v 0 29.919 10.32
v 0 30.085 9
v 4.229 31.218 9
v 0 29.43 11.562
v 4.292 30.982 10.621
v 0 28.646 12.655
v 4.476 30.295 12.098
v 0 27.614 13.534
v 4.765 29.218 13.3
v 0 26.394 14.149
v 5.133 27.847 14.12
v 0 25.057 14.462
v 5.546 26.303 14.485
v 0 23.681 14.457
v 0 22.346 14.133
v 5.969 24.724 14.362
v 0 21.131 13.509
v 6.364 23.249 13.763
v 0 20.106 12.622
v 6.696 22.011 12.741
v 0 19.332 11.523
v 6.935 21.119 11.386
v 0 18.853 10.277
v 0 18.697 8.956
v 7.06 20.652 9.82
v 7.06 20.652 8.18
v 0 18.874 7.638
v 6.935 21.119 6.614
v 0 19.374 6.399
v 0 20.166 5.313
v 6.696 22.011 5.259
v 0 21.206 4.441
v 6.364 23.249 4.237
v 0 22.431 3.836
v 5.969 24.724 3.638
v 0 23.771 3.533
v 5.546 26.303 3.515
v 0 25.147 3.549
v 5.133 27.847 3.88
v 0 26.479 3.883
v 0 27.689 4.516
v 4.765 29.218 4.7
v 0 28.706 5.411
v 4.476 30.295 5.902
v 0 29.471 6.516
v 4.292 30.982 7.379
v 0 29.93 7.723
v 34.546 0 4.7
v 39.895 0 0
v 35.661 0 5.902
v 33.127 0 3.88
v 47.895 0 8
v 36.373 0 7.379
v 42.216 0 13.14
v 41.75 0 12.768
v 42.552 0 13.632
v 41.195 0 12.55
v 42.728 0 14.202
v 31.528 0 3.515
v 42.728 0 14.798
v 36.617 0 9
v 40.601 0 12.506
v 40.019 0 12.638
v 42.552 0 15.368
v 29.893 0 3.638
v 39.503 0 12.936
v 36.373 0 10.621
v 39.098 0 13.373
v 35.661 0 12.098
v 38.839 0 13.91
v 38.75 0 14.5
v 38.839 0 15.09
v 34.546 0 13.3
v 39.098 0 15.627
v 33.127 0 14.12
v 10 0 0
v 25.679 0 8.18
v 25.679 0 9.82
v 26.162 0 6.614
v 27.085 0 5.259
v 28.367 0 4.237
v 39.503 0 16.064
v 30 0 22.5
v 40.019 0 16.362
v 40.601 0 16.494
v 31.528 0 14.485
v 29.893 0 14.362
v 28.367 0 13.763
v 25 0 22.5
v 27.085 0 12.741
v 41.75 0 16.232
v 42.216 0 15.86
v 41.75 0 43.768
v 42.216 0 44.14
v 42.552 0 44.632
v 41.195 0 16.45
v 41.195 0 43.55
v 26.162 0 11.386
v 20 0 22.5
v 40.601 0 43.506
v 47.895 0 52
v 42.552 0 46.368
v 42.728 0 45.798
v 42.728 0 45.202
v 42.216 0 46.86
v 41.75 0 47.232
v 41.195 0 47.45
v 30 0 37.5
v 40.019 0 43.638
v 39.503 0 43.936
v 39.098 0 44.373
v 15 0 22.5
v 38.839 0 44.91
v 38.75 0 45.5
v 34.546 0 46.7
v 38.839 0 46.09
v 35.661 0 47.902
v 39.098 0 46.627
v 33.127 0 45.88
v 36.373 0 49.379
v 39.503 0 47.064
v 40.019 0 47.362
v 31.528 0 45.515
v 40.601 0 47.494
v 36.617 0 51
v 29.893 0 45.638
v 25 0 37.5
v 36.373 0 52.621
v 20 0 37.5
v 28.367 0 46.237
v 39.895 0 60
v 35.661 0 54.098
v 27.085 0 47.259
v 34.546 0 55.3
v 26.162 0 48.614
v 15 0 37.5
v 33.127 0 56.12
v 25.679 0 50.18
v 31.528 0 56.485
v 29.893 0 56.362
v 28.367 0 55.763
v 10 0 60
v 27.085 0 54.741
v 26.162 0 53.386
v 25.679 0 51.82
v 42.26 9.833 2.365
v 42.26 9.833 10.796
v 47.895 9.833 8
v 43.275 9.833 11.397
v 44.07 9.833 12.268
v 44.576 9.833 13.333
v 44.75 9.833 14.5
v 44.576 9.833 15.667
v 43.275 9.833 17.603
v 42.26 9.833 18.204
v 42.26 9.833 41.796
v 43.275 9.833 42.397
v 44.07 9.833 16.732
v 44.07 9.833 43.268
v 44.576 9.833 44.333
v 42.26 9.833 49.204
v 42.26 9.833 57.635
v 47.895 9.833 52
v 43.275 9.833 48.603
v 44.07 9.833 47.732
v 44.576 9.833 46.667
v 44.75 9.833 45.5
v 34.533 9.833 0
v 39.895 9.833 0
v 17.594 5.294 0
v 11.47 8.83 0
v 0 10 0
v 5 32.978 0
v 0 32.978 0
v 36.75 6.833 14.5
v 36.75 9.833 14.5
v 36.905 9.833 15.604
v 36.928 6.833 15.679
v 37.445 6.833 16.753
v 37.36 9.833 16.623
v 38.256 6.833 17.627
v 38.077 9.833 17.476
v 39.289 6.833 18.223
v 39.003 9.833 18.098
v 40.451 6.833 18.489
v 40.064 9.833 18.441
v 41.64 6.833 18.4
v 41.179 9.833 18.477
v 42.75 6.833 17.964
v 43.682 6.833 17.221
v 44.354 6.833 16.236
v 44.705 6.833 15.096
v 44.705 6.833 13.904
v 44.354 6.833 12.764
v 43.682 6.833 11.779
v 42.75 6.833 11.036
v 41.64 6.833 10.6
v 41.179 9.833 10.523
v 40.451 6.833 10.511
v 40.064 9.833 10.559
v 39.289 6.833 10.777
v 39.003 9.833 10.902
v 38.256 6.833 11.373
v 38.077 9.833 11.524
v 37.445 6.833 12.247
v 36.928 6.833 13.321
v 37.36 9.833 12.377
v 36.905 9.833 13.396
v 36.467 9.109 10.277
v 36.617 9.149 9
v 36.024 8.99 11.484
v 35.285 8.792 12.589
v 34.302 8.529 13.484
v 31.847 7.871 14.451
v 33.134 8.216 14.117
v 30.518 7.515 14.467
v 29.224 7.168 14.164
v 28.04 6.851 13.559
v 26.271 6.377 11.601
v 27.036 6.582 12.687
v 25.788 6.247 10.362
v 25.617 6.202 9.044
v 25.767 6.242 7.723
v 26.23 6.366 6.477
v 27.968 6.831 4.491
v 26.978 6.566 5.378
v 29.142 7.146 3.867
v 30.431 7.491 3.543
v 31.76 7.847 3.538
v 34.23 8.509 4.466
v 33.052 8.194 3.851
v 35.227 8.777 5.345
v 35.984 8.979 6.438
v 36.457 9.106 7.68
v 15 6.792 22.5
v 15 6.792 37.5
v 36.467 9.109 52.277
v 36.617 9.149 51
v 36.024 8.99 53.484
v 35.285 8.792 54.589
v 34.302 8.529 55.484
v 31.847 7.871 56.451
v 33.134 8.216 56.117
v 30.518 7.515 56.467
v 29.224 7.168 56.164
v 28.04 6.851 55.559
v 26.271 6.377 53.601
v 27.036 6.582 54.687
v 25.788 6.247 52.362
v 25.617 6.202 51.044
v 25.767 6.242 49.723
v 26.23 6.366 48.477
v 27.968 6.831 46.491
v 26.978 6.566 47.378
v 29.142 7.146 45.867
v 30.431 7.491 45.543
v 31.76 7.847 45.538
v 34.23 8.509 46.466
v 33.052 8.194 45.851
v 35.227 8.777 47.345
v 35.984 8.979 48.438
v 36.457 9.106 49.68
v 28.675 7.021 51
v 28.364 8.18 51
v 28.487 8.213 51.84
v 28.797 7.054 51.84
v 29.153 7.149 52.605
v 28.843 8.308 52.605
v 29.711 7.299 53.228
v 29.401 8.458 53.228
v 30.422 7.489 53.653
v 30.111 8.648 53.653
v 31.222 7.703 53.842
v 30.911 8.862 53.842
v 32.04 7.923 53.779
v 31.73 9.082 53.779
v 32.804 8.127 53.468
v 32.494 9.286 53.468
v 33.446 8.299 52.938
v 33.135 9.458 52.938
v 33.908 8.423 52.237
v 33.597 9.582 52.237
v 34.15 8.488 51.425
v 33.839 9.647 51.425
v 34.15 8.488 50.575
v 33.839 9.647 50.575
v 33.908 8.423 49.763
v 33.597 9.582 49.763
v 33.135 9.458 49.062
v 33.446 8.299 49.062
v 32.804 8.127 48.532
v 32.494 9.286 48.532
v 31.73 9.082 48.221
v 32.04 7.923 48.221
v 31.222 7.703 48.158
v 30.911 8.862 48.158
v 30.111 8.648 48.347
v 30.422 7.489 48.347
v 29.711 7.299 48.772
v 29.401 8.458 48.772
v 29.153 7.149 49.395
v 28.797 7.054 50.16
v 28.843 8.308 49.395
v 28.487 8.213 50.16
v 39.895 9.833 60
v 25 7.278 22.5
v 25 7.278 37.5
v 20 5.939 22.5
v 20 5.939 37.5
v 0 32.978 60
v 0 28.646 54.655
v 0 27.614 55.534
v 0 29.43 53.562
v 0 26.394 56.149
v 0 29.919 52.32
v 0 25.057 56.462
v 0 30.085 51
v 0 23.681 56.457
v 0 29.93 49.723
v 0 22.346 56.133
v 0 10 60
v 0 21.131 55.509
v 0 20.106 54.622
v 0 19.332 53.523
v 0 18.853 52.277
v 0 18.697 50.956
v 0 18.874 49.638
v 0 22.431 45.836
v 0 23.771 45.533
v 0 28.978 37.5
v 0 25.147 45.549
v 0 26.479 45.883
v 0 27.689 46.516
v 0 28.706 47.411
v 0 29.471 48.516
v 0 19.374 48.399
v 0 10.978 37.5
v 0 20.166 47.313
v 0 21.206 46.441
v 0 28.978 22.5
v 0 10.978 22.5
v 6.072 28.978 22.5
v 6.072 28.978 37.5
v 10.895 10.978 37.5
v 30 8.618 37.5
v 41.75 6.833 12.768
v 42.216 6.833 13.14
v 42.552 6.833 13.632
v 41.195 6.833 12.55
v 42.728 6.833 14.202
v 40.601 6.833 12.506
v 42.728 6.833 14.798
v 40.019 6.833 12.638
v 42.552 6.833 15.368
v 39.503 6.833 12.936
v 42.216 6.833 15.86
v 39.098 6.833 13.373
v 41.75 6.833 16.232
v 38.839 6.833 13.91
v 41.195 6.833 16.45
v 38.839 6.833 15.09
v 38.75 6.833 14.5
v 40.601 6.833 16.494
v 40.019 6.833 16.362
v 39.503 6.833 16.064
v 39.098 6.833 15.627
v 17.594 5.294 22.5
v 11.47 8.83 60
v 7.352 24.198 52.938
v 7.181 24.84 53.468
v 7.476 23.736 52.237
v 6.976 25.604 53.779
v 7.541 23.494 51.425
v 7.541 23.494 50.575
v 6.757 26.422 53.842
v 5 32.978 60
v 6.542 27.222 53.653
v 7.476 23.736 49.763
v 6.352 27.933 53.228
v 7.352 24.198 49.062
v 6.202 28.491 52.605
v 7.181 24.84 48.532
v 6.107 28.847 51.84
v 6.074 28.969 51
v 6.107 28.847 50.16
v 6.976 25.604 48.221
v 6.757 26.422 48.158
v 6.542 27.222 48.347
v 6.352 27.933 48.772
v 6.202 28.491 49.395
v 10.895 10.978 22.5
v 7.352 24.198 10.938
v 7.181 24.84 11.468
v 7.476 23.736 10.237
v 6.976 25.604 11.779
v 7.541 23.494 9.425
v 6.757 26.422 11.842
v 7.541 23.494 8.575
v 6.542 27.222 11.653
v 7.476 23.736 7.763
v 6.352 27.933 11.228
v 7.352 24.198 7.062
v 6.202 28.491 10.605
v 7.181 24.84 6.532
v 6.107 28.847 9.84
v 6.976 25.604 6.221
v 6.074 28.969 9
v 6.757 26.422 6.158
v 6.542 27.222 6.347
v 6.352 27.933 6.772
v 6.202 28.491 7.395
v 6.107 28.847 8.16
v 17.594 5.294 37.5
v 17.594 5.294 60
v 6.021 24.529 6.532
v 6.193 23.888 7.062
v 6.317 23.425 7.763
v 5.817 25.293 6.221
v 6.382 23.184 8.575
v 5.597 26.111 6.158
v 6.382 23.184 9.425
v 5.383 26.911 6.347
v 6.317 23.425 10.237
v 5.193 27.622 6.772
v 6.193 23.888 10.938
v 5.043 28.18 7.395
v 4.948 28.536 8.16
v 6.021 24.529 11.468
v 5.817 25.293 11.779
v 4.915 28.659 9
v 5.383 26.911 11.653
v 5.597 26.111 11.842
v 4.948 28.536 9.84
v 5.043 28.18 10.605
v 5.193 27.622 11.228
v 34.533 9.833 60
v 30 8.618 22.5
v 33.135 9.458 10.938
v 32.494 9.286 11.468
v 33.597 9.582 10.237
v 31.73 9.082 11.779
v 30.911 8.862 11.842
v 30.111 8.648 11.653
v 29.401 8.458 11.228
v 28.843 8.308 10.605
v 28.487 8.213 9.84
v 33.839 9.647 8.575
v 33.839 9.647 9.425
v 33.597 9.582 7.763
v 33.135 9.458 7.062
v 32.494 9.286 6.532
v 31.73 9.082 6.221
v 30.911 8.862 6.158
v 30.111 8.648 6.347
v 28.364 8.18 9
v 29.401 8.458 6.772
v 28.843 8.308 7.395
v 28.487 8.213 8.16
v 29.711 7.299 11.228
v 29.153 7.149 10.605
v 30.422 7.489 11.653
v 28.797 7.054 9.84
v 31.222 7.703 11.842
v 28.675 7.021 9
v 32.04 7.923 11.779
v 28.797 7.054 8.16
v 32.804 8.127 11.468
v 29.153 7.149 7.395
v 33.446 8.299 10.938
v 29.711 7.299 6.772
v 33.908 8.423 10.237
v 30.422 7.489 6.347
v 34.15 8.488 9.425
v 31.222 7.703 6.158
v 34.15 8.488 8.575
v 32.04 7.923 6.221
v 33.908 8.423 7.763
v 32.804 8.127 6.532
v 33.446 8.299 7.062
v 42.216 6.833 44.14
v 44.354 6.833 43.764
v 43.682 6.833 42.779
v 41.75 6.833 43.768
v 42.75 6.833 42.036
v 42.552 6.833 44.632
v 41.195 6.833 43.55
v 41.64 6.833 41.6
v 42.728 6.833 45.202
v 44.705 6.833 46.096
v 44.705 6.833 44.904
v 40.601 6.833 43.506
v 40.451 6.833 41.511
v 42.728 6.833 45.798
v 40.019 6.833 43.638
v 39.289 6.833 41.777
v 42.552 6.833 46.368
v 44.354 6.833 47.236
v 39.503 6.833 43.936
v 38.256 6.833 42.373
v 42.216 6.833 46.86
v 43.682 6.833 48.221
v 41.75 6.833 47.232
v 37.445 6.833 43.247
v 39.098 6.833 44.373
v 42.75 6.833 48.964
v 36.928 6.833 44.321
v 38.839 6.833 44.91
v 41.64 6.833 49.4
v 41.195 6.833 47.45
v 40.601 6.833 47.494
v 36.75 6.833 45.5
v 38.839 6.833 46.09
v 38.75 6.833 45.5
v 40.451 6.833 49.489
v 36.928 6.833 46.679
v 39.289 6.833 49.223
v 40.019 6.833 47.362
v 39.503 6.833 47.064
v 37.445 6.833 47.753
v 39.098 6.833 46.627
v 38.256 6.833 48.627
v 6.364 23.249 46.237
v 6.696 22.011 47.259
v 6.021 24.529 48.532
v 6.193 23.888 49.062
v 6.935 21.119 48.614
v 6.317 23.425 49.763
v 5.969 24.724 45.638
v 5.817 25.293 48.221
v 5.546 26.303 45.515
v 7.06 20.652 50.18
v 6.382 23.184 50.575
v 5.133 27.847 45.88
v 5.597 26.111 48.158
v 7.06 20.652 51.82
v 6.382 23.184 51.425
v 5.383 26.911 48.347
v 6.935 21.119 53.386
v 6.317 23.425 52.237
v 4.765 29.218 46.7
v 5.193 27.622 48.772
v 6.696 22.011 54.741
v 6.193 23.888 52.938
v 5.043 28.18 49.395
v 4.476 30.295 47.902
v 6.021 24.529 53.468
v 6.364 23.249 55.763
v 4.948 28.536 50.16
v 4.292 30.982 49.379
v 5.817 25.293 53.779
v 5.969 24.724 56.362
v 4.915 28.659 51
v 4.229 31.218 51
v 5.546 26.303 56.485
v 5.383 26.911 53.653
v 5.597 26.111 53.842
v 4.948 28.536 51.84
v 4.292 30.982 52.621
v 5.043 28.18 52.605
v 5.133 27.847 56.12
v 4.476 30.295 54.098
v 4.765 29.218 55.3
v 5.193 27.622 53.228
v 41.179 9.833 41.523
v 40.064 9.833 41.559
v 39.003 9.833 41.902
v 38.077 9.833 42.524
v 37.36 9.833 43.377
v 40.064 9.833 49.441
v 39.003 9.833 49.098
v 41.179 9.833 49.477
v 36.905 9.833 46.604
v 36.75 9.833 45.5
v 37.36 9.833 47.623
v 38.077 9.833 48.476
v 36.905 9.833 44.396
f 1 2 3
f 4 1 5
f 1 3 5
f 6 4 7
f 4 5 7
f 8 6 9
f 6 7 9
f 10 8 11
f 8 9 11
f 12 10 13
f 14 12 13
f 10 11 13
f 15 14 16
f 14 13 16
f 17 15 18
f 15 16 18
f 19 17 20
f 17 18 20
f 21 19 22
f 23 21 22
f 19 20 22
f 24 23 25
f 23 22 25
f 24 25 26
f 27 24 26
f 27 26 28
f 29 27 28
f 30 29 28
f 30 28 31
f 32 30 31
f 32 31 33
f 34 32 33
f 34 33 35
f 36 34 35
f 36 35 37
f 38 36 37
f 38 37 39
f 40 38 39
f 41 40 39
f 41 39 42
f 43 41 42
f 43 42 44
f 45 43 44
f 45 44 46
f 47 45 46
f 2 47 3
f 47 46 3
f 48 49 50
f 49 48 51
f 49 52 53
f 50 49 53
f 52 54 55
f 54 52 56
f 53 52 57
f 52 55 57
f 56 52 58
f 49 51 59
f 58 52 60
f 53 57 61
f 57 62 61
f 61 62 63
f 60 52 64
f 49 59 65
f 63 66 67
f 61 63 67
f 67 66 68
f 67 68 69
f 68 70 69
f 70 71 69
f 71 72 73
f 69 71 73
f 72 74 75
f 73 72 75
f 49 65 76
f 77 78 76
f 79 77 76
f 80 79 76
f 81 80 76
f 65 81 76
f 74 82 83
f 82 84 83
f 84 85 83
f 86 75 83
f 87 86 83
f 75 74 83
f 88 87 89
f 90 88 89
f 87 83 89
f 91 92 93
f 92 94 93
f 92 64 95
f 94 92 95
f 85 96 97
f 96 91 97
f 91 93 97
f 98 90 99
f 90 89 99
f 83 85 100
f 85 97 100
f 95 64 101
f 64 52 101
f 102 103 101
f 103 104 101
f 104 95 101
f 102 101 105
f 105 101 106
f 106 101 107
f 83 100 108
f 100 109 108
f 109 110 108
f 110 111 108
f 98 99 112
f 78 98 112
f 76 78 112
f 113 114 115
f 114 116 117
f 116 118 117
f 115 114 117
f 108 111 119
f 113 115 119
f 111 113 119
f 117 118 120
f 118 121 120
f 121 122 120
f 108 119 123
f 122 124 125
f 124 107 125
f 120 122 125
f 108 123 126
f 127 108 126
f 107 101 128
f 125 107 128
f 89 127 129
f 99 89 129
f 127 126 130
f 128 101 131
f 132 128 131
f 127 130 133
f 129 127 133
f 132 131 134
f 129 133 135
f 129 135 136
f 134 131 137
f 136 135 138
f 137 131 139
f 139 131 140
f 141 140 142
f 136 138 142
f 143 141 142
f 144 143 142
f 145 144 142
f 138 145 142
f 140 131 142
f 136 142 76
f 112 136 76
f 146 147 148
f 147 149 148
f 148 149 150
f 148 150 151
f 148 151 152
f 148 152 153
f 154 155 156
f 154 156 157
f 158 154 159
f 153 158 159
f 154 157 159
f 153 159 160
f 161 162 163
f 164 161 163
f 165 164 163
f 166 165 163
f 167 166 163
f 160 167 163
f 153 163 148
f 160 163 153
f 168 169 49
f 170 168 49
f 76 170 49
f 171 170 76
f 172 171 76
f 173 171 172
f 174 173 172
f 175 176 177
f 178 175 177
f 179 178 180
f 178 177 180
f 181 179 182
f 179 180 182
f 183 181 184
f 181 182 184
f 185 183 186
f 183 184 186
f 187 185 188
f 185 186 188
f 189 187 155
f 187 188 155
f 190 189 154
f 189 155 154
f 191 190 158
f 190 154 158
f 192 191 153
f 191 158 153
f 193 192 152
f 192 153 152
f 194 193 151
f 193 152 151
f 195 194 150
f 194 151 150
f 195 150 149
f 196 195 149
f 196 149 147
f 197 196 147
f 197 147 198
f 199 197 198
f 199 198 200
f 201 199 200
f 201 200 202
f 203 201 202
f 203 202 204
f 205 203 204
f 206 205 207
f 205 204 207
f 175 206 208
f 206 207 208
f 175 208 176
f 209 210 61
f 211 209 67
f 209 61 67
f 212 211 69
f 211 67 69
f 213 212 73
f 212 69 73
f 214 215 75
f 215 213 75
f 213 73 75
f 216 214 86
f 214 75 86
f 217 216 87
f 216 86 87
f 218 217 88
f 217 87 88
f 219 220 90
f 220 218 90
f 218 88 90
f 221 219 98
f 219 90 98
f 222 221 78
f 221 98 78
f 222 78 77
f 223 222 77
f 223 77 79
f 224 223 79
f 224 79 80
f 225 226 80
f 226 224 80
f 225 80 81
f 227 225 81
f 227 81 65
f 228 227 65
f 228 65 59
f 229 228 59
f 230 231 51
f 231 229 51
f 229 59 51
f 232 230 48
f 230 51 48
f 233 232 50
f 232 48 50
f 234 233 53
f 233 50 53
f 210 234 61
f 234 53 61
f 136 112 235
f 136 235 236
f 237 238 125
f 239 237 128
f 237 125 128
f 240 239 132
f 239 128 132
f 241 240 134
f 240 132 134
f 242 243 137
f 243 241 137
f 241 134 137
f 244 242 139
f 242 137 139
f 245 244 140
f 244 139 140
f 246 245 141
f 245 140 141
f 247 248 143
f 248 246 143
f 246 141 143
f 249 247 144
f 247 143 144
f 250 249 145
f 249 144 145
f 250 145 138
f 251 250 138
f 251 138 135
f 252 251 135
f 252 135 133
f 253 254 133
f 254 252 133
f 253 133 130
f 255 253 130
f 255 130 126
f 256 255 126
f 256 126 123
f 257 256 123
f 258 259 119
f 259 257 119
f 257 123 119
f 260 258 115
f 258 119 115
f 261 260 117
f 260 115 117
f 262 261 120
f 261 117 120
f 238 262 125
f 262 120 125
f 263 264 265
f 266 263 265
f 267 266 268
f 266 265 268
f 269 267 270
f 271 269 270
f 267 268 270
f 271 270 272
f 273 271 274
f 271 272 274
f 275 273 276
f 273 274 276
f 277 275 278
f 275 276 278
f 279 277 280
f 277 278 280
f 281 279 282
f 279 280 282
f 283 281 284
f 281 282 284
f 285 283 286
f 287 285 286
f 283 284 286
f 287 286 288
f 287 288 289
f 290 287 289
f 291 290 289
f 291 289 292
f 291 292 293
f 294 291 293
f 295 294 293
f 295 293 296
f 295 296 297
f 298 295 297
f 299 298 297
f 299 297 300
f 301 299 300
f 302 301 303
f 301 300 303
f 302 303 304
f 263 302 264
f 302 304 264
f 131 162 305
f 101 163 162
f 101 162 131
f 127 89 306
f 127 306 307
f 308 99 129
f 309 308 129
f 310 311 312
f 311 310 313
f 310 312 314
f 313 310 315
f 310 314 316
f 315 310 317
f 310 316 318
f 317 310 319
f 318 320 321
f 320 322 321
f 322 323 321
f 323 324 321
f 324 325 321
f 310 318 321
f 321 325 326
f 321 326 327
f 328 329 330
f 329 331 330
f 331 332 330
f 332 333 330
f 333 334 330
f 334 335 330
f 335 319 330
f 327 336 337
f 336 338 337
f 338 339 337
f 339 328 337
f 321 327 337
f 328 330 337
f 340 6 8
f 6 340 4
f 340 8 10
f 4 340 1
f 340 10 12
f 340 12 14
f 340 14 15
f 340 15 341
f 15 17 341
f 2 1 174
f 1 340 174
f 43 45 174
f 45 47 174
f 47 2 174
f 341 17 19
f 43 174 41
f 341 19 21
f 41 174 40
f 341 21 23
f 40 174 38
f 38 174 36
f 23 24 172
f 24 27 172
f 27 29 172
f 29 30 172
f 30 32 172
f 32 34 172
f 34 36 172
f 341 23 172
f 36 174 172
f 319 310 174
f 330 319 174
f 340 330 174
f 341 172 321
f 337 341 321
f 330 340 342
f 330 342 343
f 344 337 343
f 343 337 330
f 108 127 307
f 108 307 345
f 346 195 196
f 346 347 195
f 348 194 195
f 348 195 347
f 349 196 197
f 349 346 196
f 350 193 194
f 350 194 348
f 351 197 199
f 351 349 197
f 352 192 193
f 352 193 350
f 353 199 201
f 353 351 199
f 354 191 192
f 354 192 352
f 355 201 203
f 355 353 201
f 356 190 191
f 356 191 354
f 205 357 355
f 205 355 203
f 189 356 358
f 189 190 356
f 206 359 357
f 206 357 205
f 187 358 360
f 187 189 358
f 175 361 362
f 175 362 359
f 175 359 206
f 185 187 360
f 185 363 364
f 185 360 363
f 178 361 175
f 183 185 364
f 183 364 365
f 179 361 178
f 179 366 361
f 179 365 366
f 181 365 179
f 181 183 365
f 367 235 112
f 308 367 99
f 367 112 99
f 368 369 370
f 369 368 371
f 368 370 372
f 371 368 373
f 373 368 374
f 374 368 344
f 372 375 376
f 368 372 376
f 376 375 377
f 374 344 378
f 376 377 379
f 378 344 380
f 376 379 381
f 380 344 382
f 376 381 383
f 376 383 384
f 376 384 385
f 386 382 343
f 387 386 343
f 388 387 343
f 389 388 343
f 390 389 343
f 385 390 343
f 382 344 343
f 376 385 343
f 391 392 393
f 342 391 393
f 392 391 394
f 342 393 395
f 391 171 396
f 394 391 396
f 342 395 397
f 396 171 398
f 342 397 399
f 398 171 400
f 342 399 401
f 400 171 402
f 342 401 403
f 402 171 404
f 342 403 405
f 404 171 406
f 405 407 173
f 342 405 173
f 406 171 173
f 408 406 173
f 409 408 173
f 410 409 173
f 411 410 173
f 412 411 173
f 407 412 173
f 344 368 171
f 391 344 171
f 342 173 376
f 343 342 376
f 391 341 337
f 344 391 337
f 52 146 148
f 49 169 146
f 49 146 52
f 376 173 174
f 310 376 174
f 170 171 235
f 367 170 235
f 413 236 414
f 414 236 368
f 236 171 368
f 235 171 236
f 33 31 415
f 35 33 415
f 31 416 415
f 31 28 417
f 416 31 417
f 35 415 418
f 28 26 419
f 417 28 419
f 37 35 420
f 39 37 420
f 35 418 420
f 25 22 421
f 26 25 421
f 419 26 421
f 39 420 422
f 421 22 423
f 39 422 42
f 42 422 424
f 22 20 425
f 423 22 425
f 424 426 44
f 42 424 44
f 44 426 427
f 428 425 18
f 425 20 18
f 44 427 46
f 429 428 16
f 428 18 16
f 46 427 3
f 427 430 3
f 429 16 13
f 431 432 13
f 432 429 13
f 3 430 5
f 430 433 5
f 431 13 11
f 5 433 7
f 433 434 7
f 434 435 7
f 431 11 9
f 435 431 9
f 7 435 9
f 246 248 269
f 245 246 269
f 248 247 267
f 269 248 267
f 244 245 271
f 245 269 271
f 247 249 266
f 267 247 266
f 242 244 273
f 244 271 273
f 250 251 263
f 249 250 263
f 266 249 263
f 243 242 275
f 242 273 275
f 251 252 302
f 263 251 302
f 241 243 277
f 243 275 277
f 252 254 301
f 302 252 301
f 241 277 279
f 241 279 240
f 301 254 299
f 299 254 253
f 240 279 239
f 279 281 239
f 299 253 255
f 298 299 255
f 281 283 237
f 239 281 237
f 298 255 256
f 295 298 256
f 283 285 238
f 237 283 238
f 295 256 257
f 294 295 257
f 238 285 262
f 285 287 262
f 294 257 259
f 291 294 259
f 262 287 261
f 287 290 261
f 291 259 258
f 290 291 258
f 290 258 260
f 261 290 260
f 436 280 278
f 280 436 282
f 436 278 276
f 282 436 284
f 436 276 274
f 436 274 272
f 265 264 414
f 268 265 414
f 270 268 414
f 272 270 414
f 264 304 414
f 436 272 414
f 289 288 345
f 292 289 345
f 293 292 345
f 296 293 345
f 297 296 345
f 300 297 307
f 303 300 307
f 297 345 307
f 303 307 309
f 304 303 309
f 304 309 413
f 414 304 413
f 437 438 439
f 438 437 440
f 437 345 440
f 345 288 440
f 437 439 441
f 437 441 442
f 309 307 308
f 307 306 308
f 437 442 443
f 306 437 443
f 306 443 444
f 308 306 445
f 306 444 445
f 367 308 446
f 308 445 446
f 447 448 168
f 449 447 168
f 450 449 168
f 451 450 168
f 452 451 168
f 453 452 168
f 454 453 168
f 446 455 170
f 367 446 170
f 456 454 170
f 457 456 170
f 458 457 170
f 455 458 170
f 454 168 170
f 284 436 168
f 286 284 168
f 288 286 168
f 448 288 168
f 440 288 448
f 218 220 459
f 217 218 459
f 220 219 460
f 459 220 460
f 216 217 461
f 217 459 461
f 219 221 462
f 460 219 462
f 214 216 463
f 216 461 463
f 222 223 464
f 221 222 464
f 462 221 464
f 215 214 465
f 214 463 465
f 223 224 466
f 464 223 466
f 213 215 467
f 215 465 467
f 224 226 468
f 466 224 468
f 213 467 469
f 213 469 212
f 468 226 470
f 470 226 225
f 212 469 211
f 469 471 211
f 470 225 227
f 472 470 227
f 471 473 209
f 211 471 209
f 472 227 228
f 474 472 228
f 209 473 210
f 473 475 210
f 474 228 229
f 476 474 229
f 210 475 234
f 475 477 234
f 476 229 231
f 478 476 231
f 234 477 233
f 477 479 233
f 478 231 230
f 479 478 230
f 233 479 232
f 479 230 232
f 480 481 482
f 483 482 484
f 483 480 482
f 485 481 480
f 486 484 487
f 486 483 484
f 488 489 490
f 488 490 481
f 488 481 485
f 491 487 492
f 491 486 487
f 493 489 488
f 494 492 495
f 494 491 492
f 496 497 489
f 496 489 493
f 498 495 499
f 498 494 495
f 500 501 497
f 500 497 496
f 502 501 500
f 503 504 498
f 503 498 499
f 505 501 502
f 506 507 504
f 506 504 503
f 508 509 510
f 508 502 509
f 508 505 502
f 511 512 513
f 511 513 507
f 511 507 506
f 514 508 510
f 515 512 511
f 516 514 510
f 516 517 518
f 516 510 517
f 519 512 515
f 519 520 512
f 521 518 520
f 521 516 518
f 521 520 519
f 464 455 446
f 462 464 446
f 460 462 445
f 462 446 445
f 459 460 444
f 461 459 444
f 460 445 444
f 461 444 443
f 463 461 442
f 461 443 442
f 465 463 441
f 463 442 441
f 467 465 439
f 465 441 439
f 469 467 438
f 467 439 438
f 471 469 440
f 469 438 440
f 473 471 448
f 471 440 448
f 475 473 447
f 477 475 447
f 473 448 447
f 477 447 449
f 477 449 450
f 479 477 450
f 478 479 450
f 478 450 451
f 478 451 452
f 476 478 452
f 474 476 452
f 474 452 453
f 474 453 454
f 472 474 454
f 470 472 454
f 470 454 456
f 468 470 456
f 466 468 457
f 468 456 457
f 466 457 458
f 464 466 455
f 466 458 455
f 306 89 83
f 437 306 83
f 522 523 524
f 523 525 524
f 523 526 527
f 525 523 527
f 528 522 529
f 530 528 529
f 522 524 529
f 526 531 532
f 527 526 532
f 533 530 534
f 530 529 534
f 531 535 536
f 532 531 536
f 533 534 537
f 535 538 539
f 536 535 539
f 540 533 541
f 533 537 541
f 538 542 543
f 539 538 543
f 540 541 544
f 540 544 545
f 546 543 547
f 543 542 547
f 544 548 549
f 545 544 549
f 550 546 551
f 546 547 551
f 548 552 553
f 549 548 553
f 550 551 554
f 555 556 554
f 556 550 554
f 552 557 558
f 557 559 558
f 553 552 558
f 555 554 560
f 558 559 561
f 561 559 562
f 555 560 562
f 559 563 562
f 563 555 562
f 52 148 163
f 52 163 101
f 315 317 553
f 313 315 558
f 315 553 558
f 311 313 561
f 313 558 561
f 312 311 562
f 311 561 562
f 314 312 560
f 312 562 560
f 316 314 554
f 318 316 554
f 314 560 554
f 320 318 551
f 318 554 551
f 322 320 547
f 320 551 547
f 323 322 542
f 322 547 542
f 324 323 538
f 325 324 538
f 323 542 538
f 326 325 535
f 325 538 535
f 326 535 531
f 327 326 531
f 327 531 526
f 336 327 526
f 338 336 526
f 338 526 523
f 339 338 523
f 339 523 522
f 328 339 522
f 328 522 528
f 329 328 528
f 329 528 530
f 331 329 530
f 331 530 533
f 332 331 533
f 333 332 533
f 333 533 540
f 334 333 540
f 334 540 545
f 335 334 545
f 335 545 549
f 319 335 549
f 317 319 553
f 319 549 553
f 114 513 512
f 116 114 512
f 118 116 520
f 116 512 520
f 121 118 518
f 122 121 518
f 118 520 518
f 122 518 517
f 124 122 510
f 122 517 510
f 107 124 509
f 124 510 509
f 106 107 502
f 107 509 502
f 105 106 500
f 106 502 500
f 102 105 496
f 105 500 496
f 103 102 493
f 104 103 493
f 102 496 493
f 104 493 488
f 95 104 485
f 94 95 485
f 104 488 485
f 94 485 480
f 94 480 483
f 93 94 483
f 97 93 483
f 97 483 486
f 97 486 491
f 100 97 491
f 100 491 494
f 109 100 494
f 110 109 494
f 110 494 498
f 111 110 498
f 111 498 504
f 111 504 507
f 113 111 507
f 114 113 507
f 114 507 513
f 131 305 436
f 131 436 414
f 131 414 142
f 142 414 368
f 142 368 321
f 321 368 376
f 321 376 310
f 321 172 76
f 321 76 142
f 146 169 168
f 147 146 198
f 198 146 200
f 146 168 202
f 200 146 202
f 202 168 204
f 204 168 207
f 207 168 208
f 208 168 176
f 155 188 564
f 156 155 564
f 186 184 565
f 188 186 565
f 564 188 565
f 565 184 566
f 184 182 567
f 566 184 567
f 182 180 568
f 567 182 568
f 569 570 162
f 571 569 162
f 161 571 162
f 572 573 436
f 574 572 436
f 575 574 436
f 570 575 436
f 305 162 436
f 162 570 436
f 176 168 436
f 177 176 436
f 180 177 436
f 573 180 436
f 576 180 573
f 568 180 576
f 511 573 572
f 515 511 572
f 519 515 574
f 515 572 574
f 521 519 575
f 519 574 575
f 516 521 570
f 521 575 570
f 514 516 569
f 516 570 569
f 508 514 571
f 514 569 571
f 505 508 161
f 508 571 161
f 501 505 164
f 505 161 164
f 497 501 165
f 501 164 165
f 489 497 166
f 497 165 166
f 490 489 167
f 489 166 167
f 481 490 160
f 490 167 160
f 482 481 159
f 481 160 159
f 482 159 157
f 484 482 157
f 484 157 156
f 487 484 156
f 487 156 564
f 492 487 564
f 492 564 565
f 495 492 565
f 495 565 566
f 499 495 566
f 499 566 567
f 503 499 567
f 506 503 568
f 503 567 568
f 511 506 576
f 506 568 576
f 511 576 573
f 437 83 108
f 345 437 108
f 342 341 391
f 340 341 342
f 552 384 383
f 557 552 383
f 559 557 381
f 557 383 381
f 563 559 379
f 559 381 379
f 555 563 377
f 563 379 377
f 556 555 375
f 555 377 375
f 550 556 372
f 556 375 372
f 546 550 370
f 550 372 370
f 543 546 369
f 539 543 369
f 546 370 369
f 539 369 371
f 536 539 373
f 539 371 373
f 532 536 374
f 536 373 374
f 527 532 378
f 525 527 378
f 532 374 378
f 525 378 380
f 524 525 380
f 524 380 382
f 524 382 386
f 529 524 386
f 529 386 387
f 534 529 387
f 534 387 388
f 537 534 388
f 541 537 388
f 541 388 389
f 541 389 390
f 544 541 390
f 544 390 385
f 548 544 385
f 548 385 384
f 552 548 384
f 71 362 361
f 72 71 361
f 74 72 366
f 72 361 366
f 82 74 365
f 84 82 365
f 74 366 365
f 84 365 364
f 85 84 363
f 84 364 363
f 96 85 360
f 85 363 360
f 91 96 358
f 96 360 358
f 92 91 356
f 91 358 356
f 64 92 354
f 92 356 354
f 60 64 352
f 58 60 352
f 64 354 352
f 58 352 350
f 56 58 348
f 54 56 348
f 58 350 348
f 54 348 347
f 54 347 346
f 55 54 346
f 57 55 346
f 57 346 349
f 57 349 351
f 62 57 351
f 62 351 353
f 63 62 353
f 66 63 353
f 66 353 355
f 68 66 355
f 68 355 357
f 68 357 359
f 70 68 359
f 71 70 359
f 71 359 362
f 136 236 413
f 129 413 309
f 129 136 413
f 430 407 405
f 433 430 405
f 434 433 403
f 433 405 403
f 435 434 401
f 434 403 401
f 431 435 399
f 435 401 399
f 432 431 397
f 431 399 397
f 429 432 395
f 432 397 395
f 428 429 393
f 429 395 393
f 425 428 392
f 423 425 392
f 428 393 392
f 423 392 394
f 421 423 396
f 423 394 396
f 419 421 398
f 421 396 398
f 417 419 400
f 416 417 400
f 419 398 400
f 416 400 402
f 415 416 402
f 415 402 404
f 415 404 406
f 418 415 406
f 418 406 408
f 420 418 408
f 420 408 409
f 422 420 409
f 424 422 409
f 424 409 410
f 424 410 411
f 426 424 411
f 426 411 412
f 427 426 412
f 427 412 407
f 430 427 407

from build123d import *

# Parameters (mm, degrees)
BOSS_EXTRU_1_DEPTH       = 60
ESQUISSE2_R              = 2.85
ENL_V_MAT_EXTRU_1_DEPTH  = 30
ESQUISSE3_R              = 2.85
ENL_V_MAT_EXTRU_2_DEPTH  = 1.2
ENL_V_START              = -1.2
ESQUISSE4_R              = 5.5
ENL_V_MAT_EXTRU_3_DEPTH  = 30
CHANFREIN1_SIZE          = 5
CHANFREIN3_SIZE          = 10
ENL_V_MAT_EXTRU_5_REACH  = 83.872
ESQUISSE7_R              = 5.5
CHANFREIN4_SIZE          = 2
CHANFREIN4_SIZE2         = 7.464101615
BOSS_EXTRU_3_DEPTH       = 60
ESQUISSE10_R             = 2
ENL_V_MAT_EXTRU_7_DEPTH  = 60
ESQUISSE11_R             = 4
ENL_V_MAT_EXTRU_8_DEPTH  = 3
CHANFREIN5_SIZE          = 8
ESQUISSE12_W             = 5
ESQUISSE12_H             = 15
ENL_V_MAT_EXTRU_9_DEPTH  = 84.554960758
ESQUISSE13_W             = 15
ESQUISSE13_H             = 18
ENL_V_MAT_EXTRU_10_DEPTH = 84.554960758


with BuildPart() as part:
    # Esquisse1 → Boss.-Extru.1 (new body)
    with BuildSketch(Plane.XY):
        Polygon((0, 0), (44.894653535, 0), (41.742346142, 11.764571353), (12.764571353, 4), (5, 32.977774789), (0, 32.977774789), align=None)
    extrude(amount=BOSS_EXTRU_1_DEPTH)

    # Esquisse2 → Enlèv. mat.-Extru.1 (cut)
    with BuildSketch(Plane(origin=(12.909507207, 3.459092031, 0), x_dir=(0, 0, -1), z_dir=(0.965925826289071, 0.258819045102511, 0))):
        with Locations(Location((-51, 23.559989136, 0), (0, 0, 90))):
            Circle(ESQUISSE2_R)
        with Locations(Location((-9, 23.559989136, 0), (0, 0, 90))):
            Circle(ESQUISSE2_R)
    extrude(amount=-ENL_V_MAT_EXTRU_1_DEPTH, mode=Mode.SUBTRACT)

    # Esquisse3 → Enlèv. mat.-Extru.2 (cut)
    with BuildSketch(Plane(origin=(-0.144935854, 0.540907969, 0), x_dir=(0.96592582628907, 0.2588190451025147, 0), z_dir=(-0.25881904510251463, 0.9659258262890699, 0))):
        with Locations(Location((32.364905312, -9, 0), (0, 0, 180))):
            Circle(ESQUISSE3_R)
        with Locations(Location((32.364905312, -51, 0), (0, 0, 180))):
            Circle(ESQUISSE3_R)
    extrude(amount=-ENL_V_MAT_EXTRU_2_DEPTH, mode=Mode.SUBTRACT)

    # Esquisse4 → Enlèv. mat.-Extru.3 (cut)
    with BuildSketch(Plane(origin=(12.909507207, 3.459092031, 0), x_dir=(0, 0, -1), z_dir=(0.965925826289071, 0.258819045102511, 0)).offset(ENL_V_START)):
        with Locations(Location((-51, 23.559989136, 0), (0, 0, 90))):
            Circle(ESQUISSE4_R)
        with Locations(Location((-9, 23.559989136, 0), (0, 0, 90))):
            Circle(ESQUISSE4_R)
    extrude(amount=-ENL_V_MAT_EXTRU_3_DEPTH, mode=Mode.SUBTRACT)

    # Chanfrein1
    chanfrein1_edges = [part.edges().sort_by_distance(p)[0] for p in [
        (12.764571353, 4, 30),
    ]]
    chamfer(chanfrein1_edges, length=CHANFREIN1_SIZE)

    # Chanfrein3
    chanfrein3_edges = [part.edges().sort_by_distance(p)[0] for p in [
        (0, 0, 30),
    ]]
    chamfer(chanfrein3_edges, length=CHANFREIN3_SIZE)

    # Enlèv. mat.-Extru.5: up to this plane
    enl_v_mat_extru_5_end = Plane(origin=(31.427744907, 7.758450865, 51), z_dir=(-0.2588190451025147, 0.96592582628907, 0))
    # Esquisse7 → Enlèv. mat.-Extru.5 (cut, up to the surface)
    with BuildSketch(Plane.XZ, mode=Mode.PRIVATE) as enl_v_mat_extru_5_sk1:
        with Locations((31.117162053, 51)):
            Circle(ESQUISSE7_R)
    enl_v_mat_extru_5_tool1 = split(extrude(enl_v_mat_extru_5_sk1.sketch, amount=-ENL_V_MAT_EXTRU_5_REACH, mode=Mode.PRIVATE), bisect_by=enl_v_mat_extru_5_end, keep=Keep.BOTH, mode=Mode.PRIVATE)
    add(enl_v_mat_extru_5_tool1.solids().sort_by_distance((31.117162, 0, 51))[0], mode=Mode.SUBTRACT)
    # Esquisse7 → Enlèv. mat.-Extru.5 (cut, up to the surface)
    with BuildSketch(Plane.XZ, mode=Mode.PRIVATE) as enl_v_mat_extru_5_sk2:
        with Locations((31.117162053, 9)):
            Circle(ESQUISSE7_R)
    enl_v_mat_extru_5_tool2 = split(extrude(enl_v_mat_extru_5_sk2.sketch, amount=-ENL_V_MAT_EXTRU_5_REACH, mode=Mode.PRIVATE), bisect_by=enl_v_mat_extru_5_end, keep=Keep.BOTH, mode=Mode.PRIVATE)
    add(enl_v_mat_extru_5_tool2.solids().sort_by_distance((31.117162, 0, 9))[0], mode=Mode.SUBTRACT)

    # Chanfrein4
    chanfrein4_edges = [part.edges().sort_by_distance(p)[0] for p in [
        (41.742346142, 11.764571353, 30),
    ]]
    chanfrein4_side = [part.faces().sort_by_distance(p)[0] for p in [
        (43.318499838, 5.882285677, 30),
    ]]
    chamfer(chanfrein4_edges, length=CHANFREIN4_SIZE, length2=CHANFREIN4_SIZE2, reference=chanfrein4_side[0])

    # Esquisse8 → Boss.-Extru.3 (add)
    with BuildSketch(Plane.XY.offset(60)):
        Polygon((42.259984232, 9.8327197), (47.894653535, 9.8327197), (47.894653535, 0), (44.894653535, 0), align=None)
    extrude(amount=-BOSS_EXTRU_3_DEPTH)

    # Esquisse10 → Enlèv. mat.-Extru.7 (cut)
    with BuildSketch(Plane(origin=(0, 9.8327197, 0), x_dir=(1, 0, 0), z_dir=(0, 1, 0))):
        with Locations(Location((40.75, -14.5, 0), (0, 0, 180))):
            Circle(ESQUISSE10_R)
        with Locations(Location((40.75, -45.5, 0), (0, 0, 180))):
            Circle(ESQUISSE10_R)
    extrude(amount=-ENL_V_MAT_EXTRU_7_DEPTH, mode=Mode.SUBTRACT)

    # Esquisse11 → Enlèv. mat.-Extru.8 (cut)
    with BuildSketch(Plane(origin=(0, 9.8327197, 0), x_dir=(1, 0, 0), z_dir=(0, 1, 0))):
        with Locations(Location((40.75, -14.5, 0), (0, 0, 180))):
            Circle(ESQUISSE11_R)
        with Locations(Location((40.75, -45.5, 0), (0, 0, 180))):
            Circle(ESQUISSE11_R)
    extrude(amount=-ENL_V_MAT_EXTRU_8_DEPTH, mode=Mode.SUBTRACT)

    # Chanfrein5
    chanfrein5_edges = [part.edges().sort_by_distance(p)[0] for p in [
        (47.894653535, 4.91635985, 0),
        (47.894653535, 4.91635985, 60),
    ]]
    chamfer(chanfrein5_edges, length=CHANFREIN5_SIZE)

    # Esquisse12 → Enlèv. mat.-Extru.9 (cut, through all)
    with BuildSketch(Plane.XZ):
        with Locations((17.5, 30)):
            Rectangle(ESQUISSE12_W, ESQUISSE12_H)
        with Locations((27.5, 30)):
            Rectangle(ESQUISSE12_W, ESQUISSE12_H)
    extrude(amount=-ENL_V_MAT_EXTRU_9_DEPTH, mode=Mode.SUBTRACT)

    # Esquisse13 → Enlèv. mat.-Extru.10 (cut, through all)
    with BuildSketch(Plane.ZY):
        with Locations((30, 19.977774789)):
            Rectangle(ESQUISSE13_W, ESQUISSE13_H)
    extrude(amount=-ENL_V_MAT_EXTRU_10_DEPTH, mode=Mode.SUBTRACT)


solid = part.part
